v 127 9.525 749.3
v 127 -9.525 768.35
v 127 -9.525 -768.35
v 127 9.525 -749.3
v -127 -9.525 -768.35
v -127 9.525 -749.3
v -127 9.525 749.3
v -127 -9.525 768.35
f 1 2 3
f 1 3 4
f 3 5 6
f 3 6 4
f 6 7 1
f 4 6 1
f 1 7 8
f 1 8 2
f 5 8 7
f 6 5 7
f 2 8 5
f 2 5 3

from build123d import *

# Parameters (mm, degrees)
F0_W     = 254
F0_H     = 19.05
F1_DEPTH = 768.35
F2_SIZE2 = 19.04999
F2_SIZE  = 19.04999


# Not quite as in the source:
# - a fillet or chamfer is up to 0.001 mm smaller than in the source, because OpenCascade refuses the exact size


with BuildPart() as f1:
    # F0 (on Top) → F1 (new body, symmetric)
    with BuildSketch(Plane.XY):
        Rectangle(F0_W, F0_H)
    extrude(amount=F1_DEPTH, both=True)

    # F2 (size 19.05 and 19.05 in the source; OpenCascade refuses exactly that, so slightly less here)
    f2_edges = [f1.edges().sort_by_distance(p)[0] for p in [
        (0, 9.525, 768.35),
        (0, 9.525, -768.35),
    ]]
    chamfer(f2_edges, length=F2_SIZE, length2=F2_SIZE2)


solid = f1.part
